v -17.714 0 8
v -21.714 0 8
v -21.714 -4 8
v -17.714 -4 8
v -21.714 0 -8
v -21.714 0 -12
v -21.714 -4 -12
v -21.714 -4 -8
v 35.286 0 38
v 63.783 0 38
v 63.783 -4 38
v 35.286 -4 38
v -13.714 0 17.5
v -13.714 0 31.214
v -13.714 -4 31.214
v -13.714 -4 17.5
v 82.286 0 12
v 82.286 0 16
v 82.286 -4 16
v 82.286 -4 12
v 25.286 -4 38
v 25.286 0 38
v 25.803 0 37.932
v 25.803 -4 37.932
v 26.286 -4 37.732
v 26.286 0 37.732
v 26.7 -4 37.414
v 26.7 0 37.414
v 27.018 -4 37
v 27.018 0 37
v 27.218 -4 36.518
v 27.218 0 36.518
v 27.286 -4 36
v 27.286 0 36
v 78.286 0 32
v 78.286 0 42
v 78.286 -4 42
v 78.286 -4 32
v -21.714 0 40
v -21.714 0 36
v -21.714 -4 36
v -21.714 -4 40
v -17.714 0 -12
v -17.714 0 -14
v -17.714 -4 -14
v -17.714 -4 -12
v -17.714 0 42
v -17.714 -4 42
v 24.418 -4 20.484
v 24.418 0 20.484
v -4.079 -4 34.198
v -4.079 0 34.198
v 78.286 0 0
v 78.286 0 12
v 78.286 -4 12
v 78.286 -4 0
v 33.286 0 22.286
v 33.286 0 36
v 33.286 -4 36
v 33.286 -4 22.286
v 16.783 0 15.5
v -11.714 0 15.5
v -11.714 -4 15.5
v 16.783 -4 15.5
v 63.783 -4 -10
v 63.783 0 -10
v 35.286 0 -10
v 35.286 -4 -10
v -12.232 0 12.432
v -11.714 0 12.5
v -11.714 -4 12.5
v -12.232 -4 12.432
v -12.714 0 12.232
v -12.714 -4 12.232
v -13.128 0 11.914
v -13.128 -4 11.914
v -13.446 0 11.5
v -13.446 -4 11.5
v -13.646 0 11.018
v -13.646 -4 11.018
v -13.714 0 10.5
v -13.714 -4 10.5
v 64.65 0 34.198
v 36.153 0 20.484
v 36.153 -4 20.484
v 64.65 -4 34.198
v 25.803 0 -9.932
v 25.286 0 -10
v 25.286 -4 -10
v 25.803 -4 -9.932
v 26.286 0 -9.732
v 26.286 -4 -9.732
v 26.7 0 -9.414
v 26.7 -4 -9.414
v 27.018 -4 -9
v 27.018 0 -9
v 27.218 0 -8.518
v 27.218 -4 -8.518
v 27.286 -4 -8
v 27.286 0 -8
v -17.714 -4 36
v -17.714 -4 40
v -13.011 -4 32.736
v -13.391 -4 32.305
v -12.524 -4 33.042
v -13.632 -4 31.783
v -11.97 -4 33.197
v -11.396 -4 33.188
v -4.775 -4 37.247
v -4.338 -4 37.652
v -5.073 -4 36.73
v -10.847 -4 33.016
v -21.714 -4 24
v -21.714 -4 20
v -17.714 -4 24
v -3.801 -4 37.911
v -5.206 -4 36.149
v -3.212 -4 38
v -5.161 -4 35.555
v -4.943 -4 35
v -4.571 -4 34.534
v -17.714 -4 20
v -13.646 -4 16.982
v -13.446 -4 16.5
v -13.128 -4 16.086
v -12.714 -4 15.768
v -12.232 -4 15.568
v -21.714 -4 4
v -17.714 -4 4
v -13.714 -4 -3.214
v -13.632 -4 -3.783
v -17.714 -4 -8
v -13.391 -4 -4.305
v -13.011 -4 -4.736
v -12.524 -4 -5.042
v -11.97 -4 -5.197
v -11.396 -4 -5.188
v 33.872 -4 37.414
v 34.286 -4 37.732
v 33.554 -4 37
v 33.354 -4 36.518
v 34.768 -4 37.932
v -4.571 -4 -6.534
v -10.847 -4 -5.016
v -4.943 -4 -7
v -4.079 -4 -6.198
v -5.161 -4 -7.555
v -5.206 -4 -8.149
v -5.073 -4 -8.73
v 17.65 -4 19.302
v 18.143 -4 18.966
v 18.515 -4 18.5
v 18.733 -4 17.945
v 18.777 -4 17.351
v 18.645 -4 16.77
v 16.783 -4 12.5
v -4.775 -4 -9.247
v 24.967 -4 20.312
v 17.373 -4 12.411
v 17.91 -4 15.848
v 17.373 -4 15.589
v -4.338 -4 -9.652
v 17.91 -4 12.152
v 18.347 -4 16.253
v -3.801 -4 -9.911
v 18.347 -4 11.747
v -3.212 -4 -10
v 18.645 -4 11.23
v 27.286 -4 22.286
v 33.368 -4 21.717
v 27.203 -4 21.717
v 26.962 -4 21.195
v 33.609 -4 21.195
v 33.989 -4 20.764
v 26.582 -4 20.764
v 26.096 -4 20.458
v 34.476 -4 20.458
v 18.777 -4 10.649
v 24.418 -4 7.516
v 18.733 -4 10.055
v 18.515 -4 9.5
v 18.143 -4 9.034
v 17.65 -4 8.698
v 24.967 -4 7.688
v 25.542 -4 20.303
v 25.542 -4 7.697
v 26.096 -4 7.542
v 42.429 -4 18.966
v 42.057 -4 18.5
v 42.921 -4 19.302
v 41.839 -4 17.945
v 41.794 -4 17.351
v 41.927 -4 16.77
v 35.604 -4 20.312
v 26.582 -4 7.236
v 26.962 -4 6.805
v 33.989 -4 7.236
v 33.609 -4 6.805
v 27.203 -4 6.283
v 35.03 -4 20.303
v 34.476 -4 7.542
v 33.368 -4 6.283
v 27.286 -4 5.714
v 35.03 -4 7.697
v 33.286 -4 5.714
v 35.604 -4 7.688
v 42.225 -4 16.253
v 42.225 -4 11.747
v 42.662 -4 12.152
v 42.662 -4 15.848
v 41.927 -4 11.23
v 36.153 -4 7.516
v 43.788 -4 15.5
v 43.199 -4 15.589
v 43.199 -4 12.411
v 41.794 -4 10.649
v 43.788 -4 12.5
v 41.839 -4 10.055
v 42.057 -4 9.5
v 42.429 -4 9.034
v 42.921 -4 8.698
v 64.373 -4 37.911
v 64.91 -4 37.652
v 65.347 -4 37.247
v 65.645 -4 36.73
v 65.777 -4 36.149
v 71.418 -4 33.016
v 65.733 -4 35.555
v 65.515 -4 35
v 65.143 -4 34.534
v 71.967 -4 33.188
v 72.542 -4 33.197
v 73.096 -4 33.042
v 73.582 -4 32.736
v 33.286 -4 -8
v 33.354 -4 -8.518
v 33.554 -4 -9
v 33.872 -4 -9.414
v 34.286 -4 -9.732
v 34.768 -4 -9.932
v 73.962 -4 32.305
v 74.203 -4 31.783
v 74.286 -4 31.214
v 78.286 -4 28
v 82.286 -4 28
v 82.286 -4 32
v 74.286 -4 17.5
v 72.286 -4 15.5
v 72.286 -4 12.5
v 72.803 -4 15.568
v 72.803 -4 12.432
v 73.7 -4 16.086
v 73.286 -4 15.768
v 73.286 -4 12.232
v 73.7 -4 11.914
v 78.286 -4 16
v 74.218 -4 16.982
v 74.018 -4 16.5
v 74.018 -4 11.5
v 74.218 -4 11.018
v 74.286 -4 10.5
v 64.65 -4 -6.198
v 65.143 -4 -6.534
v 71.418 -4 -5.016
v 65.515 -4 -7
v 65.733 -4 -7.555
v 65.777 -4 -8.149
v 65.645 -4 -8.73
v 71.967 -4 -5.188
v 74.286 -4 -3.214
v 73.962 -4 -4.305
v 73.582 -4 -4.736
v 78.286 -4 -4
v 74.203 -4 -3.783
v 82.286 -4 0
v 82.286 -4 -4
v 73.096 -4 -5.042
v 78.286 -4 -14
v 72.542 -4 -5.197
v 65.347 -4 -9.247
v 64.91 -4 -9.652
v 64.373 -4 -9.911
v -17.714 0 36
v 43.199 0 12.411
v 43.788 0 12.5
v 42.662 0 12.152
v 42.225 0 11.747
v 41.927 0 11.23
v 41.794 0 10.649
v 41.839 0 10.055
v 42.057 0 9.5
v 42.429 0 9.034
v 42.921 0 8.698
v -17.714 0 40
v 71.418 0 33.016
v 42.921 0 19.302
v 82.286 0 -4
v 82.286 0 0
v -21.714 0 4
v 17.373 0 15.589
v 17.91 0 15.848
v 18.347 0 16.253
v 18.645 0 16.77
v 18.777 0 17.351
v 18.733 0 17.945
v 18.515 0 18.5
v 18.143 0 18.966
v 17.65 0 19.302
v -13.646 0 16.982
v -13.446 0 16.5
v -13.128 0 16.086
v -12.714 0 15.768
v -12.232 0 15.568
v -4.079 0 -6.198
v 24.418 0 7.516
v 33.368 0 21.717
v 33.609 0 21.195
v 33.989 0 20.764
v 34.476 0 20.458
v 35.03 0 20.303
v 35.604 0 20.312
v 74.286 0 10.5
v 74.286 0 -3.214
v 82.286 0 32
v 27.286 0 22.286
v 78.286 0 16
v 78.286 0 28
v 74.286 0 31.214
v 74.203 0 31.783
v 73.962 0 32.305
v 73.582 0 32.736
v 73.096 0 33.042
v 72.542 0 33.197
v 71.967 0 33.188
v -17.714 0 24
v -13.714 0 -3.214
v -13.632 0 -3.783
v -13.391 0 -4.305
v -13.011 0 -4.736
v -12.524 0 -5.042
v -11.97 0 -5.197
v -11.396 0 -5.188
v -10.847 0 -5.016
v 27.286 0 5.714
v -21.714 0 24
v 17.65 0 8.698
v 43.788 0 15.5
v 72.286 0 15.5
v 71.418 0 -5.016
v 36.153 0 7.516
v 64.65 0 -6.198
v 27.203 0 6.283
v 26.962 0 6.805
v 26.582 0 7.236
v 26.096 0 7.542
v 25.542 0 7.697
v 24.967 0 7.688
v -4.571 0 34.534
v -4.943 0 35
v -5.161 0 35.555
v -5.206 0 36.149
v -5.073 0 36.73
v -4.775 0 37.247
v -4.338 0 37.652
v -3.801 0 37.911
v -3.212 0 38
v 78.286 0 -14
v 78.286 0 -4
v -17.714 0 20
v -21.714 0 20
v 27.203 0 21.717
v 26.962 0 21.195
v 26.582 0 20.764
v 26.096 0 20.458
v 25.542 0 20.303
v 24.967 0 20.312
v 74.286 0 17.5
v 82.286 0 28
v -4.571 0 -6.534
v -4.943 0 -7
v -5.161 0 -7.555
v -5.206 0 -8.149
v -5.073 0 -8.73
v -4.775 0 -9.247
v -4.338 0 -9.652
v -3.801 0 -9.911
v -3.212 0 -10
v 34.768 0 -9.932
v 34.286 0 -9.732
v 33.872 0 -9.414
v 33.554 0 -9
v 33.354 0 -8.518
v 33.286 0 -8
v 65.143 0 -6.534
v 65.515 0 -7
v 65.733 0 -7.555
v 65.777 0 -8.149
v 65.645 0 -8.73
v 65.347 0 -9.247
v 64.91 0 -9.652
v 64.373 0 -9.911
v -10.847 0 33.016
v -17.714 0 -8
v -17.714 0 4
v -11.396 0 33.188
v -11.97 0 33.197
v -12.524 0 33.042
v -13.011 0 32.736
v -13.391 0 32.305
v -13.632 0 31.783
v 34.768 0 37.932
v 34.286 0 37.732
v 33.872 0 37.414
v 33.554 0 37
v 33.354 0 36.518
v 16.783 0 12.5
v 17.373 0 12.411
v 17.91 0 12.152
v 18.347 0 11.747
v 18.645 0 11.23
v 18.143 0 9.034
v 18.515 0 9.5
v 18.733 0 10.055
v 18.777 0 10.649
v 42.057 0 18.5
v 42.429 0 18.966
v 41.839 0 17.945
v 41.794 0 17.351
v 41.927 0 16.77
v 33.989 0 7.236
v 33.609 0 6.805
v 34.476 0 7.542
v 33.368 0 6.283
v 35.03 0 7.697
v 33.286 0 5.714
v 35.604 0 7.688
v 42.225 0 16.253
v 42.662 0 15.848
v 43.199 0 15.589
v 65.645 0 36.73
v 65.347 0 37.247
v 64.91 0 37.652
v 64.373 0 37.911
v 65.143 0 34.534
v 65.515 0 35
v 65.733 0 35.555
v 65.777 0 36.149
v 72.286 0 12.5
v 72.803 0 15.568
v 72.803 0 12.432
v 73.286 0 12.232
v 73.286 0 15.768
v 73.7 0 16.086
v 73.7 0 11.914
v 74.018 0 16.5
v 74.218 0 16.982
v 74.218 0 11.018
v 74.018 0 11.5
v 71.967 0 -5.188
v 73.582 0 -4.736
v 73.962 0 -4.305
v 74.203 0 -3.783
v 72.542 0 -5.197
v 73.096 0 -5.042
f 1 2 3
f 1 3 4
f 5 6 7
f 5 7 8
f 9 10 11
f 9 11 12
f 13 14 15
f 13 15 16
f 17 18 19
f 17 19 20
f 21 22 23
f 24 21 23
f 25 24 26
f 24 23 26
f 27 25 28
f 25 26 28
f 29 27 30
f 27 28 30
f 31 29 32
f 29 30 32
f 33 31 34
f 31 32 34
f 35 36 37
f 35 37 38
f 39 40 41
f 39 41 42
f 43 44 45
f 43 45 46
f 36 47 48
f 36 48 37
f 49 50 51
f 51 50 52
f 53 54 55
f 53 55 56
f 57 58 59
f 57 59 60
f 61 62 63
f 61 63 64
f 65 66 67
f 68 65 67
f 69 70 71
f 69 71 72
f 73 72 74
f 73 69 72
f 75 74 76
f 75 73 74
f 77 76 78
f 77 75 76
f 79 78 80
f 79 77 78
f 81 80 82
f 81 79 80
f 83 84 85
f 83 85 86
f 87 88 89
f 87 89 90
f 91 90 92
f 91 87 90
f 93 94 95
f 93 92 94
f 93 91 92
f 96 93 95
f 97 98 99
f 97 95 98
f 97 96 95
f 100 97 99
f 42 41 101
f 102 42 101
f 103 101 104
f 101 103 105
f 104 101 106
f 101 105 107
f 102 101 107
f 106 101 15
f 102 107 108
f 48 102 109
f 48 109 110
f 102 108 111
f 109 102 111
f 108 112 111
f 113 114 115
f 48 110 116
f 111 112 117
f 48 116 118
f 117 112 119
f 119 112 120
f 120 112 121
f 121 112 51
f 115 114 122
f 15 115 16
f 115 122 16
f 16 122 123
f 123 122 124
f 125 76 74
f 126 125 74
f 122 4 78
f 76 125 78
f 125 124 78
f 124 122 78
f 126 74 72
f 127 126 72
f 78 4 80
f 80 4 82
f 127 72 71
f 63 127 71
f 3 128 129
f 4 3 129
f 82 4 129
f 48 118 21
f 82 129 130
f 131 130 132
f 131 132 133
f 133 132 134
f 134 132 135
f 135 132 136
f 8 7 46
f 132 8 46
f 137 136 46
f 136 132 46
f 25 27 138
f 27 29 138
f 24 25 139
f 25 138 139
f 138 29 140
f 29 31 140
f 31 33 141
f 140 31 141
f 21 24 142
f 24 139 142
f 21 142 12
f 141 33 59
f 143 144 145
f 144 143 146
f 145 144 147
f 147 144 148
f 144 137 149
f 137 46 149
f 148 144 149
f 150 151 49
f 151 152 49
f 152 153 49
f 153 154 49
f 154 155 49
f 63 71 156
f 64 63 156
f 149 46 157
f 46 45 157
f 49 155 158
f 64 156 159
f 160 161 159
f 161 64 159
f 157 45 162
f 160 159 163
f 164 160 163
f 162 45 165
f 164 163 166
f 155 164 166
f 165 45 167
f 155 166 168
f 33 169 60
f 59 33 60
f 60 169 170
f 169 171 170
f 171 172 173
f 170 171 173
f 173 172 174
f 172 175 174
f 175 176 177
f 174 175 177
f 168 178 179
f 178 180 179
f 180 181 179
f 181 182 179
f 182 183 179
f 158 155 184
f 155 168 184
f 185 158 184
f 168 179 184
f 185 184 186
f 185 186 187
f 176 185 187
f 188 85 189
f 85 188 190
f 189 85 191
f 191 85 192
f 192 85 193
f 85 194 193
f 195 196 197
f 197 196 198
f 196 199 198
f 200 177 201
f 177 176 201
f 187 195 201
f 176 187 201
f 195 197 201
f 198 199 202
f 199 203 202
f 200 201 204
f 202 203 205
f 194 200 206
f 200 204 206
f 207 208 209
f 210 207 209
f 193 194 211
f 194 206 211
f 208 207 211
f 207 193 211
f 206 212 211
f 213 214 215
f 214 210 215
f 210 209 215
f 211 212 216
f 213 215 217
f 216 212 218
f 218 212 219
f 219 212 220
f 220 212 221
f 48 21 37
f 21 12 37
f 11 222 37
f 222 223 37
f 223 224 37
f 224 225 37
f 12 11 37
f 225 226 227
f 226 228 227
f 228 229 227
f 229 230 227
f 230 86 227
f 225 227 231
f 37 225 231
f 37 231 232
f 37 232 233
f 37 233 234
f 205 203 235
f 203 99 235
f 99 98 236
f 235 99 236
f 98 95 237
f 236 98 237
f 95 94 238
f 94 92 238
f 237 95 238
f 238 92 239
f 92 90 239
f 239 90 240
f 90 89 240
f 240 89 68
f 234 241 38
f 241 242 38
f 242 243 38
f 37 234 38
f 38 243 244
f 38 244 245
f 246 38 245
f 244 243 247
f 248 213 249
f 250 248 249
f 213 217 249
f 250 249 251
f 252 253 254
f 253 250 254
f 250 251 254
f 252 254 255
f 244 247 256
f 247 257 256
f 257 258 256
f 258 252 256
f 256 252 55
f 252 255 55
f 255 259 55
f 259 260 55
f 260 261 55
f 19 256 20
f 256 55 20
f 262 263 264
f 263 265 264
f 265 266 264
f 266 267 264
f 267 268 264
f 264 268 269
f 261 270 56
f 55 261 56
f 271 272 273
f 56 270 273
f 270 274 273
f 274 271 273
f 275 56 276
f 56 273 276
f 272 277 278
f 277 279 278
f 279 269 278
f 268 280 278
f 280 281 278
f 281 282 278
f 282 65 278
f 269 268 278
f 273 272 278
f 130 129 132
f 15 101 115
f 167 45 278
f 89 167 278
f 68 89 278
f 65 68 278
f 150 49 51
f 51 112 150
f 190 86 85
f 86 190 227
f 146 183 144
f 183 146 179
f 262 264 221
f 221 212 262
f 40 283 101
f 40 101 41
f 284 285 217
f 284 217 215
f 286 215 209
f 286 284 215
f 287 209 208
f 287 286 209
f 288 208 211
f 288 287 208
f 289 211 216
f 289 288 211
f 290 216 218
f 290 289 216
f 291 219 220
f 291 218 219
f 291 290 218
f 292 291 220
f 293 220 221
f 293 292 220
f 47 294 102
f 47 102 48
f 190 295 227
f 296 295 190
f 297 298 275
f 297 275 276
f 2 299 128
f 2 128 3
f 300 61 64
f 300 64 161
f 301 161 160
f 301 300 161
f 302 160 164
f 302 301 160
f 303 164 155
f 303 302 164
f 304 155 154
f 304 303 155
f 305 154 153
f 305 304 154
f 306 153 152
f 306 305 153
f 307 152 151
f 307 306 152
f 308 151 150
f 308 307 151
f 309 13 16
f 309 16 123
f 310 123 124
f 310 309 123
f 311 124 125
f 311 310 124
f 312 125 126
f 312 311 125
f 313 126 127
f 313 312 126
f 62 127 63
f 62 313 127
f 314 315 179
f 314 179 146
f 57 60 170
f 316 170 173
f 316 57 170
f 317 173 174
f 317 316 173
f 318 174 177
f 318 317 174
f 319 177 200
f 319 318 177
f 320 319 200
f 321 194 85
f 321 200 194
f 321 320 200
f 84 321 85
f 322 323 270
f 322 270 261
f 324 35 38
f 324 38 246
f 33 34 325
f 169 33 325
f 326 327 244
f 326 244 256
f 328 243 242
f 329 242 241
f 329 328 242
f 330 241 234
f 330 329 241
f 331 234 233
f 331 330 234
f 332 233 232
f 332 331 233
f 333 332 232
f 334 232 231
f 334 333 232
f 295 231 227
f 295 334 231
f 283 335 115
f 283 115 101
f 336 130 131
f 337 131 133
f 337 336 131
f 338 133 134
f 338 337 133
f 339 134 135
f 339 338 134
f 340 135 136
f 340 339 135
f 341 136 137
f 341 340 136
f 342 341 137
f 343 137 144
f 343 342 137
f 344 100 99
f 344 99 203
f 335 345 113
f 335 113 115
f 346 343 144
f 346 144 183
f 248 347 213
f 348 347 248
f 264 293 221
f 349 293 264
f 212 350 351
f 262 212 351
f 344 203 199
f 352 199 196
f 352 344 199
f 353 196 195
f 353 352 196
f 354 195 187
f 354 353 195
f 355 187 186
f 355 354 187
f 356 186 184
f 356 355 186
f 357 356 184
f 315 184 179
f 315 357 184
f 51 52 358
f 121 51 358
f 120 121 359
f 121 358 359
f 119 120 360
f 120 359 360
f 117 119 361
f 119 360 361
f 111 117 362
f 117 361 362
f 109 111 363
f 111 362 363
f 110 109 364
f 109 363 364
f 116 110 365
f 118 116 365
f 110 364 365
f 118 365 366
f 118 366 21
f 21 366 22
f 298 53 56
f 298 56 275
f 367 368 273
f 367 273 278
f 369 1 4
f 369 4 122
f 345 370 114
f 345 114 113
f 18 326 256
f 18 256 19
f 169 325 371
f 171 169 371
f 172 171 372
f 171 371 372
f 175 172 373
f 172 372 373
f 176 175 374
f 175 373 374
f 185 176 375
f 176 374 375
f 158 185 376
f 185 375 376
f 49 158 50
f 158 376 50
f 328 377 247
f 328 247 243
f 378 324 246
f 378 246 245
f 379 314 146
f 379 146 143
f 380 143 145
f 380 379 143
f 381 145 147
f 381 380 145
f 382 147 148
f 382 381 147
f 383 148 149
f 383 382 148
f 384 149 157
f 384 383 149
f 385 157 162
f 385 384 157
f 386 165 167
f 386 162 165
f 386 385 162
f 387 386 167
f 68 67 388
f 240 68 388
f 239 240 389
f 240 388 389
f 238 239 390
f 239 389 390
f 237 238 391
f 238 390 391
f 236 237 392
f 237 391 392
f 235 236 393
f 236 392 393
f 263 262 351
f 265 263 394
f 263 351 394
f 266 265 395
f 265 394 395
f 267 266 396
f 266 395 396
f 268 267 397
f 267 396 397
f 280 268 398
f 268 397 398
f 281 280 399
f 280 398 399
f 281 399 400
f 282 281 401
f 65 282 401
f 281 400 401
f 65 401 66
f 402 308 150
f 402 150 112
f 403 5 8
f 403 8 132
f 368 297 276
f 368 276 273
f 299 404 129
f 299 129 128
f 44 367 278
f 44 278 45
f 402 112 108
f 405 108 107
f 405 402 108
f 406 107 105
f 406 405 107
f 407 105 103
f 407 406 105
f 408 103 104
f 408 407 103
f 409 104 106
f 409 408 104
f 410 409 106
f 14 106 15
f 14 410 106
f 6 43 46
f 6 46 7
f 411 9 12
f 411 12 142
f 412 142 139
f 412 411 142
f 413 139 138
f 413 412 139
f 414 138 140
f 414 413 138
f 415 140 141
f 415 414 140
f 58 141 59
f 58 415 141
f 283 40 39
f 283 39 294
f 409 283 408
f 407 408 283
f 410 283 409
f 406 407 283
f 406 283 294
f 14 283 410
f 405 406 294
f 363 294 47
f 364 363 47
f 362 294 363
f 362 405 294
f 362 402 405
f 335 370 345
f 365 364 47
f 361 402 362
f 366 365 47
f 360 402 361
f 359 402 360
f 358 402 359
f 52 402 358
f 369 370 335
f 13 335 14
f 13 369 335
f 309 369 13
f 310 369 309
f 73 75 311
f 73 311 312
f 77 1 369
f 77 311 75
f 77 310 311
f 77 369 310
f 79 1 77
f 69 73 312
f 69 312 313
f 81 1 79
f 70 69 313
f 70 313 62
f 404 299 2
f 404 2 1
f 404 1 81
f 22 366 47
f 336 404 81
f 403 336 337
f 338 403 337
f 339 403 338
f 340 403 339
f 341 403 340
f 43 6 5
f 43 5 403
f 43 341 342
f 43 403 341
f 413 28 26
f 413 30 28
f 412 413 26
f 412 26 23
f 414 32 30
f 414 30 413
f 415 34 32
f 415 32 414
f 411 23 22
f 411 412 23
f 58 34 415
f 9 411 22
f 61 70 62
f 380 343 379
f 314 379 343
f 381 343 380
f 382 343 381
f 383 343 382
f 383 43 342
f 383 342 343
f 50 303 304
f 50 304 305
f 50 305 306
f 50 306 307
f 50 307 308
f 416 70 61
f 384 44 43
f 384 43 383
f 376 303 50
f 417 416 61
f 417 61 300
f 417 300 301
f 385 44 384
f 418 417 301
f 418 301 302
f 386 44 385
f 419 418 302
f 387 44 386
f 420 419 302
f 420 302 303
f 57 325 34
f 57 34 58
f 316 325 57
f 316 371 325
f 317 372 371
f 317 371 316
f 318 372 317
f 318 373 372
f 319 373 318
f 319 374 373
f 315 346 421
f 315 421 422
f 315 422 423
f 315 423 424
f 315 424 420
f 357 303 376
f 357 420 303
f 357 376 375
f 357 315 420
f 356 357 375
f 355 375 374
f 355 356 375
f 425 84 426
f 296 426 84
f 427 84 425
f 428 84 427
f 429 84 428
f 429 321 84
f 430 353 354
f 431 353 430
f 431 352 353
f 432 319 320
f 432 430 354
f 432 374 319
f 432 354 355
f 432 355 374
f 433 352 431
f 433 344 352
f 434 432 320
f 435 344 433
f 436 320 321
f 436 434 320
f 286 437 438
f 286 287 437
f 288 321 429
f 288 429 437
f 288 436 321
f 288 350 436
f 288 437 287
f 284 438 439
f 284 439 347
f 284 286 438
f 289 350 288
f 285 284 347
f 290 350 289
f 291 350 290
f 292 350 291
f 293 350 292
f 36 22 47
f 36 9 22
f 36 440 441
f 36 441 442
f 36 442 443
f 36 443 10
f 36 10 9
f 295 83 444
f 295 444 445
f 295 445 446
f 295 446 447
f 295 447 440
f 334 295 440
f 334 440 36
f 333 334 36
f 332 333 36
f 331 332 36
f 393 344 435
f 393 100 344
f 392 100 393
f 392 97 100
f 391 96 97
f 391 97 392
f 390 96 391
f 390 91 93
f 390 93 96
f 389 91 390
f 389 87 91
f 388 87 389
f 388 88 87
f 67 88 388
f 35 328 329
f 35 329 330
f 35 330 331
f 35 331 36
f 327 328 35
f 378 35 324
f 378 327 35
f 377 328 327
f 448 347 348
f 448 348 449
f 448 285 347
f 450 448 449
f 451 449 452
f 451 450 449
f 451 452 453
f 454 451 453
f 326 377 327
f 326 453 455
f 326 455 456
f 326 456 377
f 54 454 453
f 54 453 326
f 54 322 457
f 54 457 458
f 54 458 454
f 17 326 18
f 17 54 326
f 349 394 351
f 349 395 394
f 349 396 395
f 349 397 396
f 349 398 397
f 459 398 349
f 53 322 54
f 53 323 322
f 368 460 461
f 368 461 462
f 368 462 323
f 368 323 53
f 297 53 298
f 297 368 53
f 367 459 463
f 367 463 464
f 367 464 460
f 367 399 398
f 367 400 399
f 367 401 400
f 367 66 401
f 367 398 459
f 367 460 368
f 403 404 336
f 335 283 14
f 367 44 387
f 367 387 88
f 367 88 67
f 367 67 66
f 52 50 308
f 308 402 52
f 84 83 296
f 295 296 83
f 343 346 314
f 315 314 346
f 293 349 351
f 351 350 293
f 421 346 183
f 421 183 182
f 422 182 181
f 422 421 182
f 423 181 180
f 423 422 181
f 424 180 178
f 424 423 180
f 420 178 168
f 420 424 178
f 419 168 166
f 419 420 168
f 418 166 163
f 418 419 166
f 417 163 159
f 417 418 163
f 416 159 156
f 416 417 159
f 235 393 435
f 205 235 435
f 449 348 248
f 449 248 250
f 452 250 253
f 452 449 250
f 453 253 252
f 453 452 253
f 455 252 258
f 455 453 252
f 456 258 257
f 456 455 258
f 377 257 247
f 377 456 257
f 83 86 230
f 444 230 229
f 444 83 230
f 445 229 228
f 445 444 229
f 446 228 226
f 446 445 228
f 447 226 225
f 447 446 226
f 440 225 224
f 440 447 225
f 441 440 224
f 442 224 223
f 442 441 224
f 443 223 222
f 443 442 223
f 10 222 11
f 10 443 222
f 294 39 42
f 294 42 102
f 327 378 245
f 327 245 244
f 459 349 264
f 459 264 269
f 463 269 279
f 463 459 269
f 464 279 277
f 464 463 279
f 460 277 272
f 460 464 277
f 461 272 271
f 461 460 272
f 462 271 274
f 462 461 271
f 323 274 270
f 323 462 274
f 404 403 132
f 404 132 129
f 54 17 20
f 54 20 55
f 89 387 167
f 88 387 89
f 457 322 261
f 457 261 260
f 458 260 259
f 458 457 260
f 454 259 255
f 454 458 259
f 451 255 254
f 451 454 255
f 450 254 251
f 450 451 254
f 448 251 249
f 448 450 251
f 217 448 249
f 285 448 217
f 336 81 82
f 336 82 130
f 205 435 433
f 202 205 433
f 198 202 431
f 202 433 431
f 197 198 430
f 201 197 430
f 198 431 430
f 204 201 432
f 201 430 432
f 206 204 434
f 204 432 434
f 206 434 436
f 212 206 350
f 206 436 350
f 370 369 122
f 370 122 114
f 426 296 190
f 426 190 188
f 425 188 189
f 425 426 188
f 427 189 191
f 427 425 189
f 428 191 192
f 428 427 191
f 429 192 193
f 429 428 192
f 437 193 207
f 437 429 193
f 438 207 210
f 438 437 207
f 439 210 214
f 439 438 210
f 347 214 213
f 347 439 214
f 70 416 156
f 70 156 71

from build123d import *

# Parameters (mm, degrees)
BOSS_EXTRUDE1_DEPTH = 4
CUT_EXTRUDE1_DEPTH  = 10


with BuildPart() as part:
    # Sketch1 → Boss-Extrude1 (new body)
    with BuildSketch(Plane(origin=(0, 0, 0), x_dir=(1, 0, 0), z_dir=(0, 1, 0))):
        Polygon((-17.714285714, 14), (-17.714285714, 12), (-21.714285714, 12), (-21.714285714, 8), (-17.714285714, 8), (-17.714285714, -4), (-21.714285714, -4), (-21.714285714, -8), (-17.714285714, -8), (-17.714285714, -20), (-21.714285714, -20), (-21.714285714, -24), (-17.714285714, -24), (-17.714285714, -36), (-21.714285714, -36), (-21.714285714, -40), (-17.714285714, -40), (-17.714285714, -42), (78.285714286, -42), (78.285714286, -32), (82.285714286, -32), (82.285714286, -28), (78.285714286, -28), (78.285714286, -16), (82.285714286, -16), (82.285714286, -12), (78.285714286, -12), (78.285714286, 0), (82.285714286, 0), (82.285714286, 4), (78.285714286, 4), (78.285714286, 14), align=None)
    extrude(amount=-BOSS_EXTRUDE1_DEPTH)

    # Sketch2 → Cut-Extrude1 (cut)
    with BuildSketch(Plane(origin=(0, 0, 0), x_dir=(1, 0, 0), z_dir=(0, 1, 0))):
        with BuildLine():
            Line((-3.21150143, 10), (25.285714286, 10))
            ThreePointArc((25.285714286, 10), (26.699927848, 9.414213562), (27.285714286, 8))
            Line((27.285714286, 8), (27.285714286, -5.713648924))
            ThreePointArc((27.285714286, -5.713648924), (26.350016922, -7.40694745), (24.418454387, -7.515831009))
            Line((24.418454387, -7.515831009), (-4.078761328, 6.197817915))
            ThreePointArc((-4.078761328, 6.197817915), (-5.161419911, 8.444767259), (-3.21150143, 10))
        make_face()
        with BuildLine():
            ThreePointArc((-13.714285714, 3.213648924), (-12.77858835, 4.90694745), (-10.847025816, 5.015831009))
            Line((-10.847025816, 5.015831009), (17.6501899, -8.697817915))
            ThreePointArc((17.6501899, -8.697817915), (18.732848483, -10.944767259), (16.782930001, -12.5))
            Line((16.782930001, -12.5), (-11.714285714, -12.5))
            ThreePointArc((-11.714285714, -12.5), (-13.128499277, -11.914213562), (-13.714285714, -10.5))
            Line((-13.714285714, -10.5), (-13.714285714, 3.213648924))
        make_face()
        with BuildLine():
            ThreePointArc((-13.714285714, -17.5), (-13.128499277, -16.085786438), (-11.714285714, -15.5))
            Line((-11.714285714, -15.5), (16.782930001, -15.5))
            ThreePointArc((16.782930001, -15.5), (18.732848483, -17.055232741), (17.6501899, -19.302182085))
            Line((17.6501899, -19.302182085), (-10.847025816, -33.015831009))
            ThreePointArc((-10.847025816, -33.015831009), (-12.77858835, -32.90694745), (-13.714285714, -31.213648924))
            Line((-13.714285714, -31.213648924), (-13.714285714, -17.5))
        make_face()
        with BuildLine():
            Line((27.285714286, -36), (27.285714286, -22.286351076))
            ThreePointArc((27.285714286, -22.286351076), (26.350016922, -20.59305255), (24.418454387, -20.484168991))
            Line((24.418454387, -20.484168991), (-4.078761328, -34.197817915))
            ThreePointArc((-4.078761328, -34.197817915), (-5.161419911, -36.444767259), (-3.21150143, -38))
            Line((-3.21150143, -38), (25.285714286, -38))
            ThreePointArc((25.285714286, -38), (26.699927848, -37.414213562), (27.285714286, -36))
        make_face()
        with BuildLine():
            Line((63.782930001, -38), (35.285714286, -38))
            ThreePointArc((35.285714286, -38), (33.871500723, -37.414213562), (33.285714286, -36))
            Line((33.285714286, -36), (33.285714286, -22.286351076))
            ThreePointArc((33.285714286, -22.286351076), (34.22141165, -20.59305255), (36.152974184, -20.484168991))
            Line((36.152974184, -20.484168991), (64.6501899, -34.197817915))
            ThreePointArc((64.6501899, -34.197817915), (65.732848483, -36.444767259), (63.782930001, -38))
        make_face()
        with BuildLine():
            ThreePointArc((74.285714286, -31.213648924), (73.350016922, -32.90694745), (71.418454387, -33.015831009))
            Line((71.418454387, -33.015831009), (42.921238672, -19.302182085))
            ThreePointArc((42.921238672, -19.302182085), (41.838580089, -17.055232741), (43.78849857, -15.5))
            Line((43.78849857, -15.5), (72.285714286, -15.5))
            ThreePointArc((72.285714286, -15.5), (73.699927848, -16.085786438), (74.285714286, -17.5))
            Line((74.285714286, -17.5), (74.285714286, -31.213648924))
        make_face()
        with BuildLine():
            ThreePointArc((74.285714286, -10.5), (73.699927848, -11.914213562), (72.285714286, -12.5))
            Line((72.285714286, -12.5), (43.78849857, -12.5))
            ThreePointArc((43.78849857, -12.5), (41.838580089, -10.944767259), (42.921238672, -8.697817915))
            Line((42.921238672, -8.697817915), (71.418454387, 5.015831009))
            ThreePointArc((71.418454387, 5.015831009), (73.350016922, 4.90694745), (74.285714286, 3.213648924))
            Line((74.285714286, 3.213648924), (74.285714286, -10.5))
        make_face()
        with BuildLine():
            Line((33.285714286, 8), (33.285714286, -5.713648924))
            ThreePointArc((33.285714286, -5.713648924), (34.22141165, -7.40694745), (36.152974184, -7.515831009))
            Line((36.152974184, -7.515831009), (64.6501899, 6.197817915))
            ThreePointArc((64.6501899, 6.197817915), (65.732848483, 8.444767259), (63.782930001, 10))
            Line((63.782930001, 10), (35.285714286, 10))
            ThreePointArc((35.285714286, 10), (33.871500723, 9.414213562), (33.285714286, 8))
        make_face()
    extrude(amount=-CUT_EXTRUDE1_DEPTH, mode=Mode.SUBTRACT)


solid = part.part
